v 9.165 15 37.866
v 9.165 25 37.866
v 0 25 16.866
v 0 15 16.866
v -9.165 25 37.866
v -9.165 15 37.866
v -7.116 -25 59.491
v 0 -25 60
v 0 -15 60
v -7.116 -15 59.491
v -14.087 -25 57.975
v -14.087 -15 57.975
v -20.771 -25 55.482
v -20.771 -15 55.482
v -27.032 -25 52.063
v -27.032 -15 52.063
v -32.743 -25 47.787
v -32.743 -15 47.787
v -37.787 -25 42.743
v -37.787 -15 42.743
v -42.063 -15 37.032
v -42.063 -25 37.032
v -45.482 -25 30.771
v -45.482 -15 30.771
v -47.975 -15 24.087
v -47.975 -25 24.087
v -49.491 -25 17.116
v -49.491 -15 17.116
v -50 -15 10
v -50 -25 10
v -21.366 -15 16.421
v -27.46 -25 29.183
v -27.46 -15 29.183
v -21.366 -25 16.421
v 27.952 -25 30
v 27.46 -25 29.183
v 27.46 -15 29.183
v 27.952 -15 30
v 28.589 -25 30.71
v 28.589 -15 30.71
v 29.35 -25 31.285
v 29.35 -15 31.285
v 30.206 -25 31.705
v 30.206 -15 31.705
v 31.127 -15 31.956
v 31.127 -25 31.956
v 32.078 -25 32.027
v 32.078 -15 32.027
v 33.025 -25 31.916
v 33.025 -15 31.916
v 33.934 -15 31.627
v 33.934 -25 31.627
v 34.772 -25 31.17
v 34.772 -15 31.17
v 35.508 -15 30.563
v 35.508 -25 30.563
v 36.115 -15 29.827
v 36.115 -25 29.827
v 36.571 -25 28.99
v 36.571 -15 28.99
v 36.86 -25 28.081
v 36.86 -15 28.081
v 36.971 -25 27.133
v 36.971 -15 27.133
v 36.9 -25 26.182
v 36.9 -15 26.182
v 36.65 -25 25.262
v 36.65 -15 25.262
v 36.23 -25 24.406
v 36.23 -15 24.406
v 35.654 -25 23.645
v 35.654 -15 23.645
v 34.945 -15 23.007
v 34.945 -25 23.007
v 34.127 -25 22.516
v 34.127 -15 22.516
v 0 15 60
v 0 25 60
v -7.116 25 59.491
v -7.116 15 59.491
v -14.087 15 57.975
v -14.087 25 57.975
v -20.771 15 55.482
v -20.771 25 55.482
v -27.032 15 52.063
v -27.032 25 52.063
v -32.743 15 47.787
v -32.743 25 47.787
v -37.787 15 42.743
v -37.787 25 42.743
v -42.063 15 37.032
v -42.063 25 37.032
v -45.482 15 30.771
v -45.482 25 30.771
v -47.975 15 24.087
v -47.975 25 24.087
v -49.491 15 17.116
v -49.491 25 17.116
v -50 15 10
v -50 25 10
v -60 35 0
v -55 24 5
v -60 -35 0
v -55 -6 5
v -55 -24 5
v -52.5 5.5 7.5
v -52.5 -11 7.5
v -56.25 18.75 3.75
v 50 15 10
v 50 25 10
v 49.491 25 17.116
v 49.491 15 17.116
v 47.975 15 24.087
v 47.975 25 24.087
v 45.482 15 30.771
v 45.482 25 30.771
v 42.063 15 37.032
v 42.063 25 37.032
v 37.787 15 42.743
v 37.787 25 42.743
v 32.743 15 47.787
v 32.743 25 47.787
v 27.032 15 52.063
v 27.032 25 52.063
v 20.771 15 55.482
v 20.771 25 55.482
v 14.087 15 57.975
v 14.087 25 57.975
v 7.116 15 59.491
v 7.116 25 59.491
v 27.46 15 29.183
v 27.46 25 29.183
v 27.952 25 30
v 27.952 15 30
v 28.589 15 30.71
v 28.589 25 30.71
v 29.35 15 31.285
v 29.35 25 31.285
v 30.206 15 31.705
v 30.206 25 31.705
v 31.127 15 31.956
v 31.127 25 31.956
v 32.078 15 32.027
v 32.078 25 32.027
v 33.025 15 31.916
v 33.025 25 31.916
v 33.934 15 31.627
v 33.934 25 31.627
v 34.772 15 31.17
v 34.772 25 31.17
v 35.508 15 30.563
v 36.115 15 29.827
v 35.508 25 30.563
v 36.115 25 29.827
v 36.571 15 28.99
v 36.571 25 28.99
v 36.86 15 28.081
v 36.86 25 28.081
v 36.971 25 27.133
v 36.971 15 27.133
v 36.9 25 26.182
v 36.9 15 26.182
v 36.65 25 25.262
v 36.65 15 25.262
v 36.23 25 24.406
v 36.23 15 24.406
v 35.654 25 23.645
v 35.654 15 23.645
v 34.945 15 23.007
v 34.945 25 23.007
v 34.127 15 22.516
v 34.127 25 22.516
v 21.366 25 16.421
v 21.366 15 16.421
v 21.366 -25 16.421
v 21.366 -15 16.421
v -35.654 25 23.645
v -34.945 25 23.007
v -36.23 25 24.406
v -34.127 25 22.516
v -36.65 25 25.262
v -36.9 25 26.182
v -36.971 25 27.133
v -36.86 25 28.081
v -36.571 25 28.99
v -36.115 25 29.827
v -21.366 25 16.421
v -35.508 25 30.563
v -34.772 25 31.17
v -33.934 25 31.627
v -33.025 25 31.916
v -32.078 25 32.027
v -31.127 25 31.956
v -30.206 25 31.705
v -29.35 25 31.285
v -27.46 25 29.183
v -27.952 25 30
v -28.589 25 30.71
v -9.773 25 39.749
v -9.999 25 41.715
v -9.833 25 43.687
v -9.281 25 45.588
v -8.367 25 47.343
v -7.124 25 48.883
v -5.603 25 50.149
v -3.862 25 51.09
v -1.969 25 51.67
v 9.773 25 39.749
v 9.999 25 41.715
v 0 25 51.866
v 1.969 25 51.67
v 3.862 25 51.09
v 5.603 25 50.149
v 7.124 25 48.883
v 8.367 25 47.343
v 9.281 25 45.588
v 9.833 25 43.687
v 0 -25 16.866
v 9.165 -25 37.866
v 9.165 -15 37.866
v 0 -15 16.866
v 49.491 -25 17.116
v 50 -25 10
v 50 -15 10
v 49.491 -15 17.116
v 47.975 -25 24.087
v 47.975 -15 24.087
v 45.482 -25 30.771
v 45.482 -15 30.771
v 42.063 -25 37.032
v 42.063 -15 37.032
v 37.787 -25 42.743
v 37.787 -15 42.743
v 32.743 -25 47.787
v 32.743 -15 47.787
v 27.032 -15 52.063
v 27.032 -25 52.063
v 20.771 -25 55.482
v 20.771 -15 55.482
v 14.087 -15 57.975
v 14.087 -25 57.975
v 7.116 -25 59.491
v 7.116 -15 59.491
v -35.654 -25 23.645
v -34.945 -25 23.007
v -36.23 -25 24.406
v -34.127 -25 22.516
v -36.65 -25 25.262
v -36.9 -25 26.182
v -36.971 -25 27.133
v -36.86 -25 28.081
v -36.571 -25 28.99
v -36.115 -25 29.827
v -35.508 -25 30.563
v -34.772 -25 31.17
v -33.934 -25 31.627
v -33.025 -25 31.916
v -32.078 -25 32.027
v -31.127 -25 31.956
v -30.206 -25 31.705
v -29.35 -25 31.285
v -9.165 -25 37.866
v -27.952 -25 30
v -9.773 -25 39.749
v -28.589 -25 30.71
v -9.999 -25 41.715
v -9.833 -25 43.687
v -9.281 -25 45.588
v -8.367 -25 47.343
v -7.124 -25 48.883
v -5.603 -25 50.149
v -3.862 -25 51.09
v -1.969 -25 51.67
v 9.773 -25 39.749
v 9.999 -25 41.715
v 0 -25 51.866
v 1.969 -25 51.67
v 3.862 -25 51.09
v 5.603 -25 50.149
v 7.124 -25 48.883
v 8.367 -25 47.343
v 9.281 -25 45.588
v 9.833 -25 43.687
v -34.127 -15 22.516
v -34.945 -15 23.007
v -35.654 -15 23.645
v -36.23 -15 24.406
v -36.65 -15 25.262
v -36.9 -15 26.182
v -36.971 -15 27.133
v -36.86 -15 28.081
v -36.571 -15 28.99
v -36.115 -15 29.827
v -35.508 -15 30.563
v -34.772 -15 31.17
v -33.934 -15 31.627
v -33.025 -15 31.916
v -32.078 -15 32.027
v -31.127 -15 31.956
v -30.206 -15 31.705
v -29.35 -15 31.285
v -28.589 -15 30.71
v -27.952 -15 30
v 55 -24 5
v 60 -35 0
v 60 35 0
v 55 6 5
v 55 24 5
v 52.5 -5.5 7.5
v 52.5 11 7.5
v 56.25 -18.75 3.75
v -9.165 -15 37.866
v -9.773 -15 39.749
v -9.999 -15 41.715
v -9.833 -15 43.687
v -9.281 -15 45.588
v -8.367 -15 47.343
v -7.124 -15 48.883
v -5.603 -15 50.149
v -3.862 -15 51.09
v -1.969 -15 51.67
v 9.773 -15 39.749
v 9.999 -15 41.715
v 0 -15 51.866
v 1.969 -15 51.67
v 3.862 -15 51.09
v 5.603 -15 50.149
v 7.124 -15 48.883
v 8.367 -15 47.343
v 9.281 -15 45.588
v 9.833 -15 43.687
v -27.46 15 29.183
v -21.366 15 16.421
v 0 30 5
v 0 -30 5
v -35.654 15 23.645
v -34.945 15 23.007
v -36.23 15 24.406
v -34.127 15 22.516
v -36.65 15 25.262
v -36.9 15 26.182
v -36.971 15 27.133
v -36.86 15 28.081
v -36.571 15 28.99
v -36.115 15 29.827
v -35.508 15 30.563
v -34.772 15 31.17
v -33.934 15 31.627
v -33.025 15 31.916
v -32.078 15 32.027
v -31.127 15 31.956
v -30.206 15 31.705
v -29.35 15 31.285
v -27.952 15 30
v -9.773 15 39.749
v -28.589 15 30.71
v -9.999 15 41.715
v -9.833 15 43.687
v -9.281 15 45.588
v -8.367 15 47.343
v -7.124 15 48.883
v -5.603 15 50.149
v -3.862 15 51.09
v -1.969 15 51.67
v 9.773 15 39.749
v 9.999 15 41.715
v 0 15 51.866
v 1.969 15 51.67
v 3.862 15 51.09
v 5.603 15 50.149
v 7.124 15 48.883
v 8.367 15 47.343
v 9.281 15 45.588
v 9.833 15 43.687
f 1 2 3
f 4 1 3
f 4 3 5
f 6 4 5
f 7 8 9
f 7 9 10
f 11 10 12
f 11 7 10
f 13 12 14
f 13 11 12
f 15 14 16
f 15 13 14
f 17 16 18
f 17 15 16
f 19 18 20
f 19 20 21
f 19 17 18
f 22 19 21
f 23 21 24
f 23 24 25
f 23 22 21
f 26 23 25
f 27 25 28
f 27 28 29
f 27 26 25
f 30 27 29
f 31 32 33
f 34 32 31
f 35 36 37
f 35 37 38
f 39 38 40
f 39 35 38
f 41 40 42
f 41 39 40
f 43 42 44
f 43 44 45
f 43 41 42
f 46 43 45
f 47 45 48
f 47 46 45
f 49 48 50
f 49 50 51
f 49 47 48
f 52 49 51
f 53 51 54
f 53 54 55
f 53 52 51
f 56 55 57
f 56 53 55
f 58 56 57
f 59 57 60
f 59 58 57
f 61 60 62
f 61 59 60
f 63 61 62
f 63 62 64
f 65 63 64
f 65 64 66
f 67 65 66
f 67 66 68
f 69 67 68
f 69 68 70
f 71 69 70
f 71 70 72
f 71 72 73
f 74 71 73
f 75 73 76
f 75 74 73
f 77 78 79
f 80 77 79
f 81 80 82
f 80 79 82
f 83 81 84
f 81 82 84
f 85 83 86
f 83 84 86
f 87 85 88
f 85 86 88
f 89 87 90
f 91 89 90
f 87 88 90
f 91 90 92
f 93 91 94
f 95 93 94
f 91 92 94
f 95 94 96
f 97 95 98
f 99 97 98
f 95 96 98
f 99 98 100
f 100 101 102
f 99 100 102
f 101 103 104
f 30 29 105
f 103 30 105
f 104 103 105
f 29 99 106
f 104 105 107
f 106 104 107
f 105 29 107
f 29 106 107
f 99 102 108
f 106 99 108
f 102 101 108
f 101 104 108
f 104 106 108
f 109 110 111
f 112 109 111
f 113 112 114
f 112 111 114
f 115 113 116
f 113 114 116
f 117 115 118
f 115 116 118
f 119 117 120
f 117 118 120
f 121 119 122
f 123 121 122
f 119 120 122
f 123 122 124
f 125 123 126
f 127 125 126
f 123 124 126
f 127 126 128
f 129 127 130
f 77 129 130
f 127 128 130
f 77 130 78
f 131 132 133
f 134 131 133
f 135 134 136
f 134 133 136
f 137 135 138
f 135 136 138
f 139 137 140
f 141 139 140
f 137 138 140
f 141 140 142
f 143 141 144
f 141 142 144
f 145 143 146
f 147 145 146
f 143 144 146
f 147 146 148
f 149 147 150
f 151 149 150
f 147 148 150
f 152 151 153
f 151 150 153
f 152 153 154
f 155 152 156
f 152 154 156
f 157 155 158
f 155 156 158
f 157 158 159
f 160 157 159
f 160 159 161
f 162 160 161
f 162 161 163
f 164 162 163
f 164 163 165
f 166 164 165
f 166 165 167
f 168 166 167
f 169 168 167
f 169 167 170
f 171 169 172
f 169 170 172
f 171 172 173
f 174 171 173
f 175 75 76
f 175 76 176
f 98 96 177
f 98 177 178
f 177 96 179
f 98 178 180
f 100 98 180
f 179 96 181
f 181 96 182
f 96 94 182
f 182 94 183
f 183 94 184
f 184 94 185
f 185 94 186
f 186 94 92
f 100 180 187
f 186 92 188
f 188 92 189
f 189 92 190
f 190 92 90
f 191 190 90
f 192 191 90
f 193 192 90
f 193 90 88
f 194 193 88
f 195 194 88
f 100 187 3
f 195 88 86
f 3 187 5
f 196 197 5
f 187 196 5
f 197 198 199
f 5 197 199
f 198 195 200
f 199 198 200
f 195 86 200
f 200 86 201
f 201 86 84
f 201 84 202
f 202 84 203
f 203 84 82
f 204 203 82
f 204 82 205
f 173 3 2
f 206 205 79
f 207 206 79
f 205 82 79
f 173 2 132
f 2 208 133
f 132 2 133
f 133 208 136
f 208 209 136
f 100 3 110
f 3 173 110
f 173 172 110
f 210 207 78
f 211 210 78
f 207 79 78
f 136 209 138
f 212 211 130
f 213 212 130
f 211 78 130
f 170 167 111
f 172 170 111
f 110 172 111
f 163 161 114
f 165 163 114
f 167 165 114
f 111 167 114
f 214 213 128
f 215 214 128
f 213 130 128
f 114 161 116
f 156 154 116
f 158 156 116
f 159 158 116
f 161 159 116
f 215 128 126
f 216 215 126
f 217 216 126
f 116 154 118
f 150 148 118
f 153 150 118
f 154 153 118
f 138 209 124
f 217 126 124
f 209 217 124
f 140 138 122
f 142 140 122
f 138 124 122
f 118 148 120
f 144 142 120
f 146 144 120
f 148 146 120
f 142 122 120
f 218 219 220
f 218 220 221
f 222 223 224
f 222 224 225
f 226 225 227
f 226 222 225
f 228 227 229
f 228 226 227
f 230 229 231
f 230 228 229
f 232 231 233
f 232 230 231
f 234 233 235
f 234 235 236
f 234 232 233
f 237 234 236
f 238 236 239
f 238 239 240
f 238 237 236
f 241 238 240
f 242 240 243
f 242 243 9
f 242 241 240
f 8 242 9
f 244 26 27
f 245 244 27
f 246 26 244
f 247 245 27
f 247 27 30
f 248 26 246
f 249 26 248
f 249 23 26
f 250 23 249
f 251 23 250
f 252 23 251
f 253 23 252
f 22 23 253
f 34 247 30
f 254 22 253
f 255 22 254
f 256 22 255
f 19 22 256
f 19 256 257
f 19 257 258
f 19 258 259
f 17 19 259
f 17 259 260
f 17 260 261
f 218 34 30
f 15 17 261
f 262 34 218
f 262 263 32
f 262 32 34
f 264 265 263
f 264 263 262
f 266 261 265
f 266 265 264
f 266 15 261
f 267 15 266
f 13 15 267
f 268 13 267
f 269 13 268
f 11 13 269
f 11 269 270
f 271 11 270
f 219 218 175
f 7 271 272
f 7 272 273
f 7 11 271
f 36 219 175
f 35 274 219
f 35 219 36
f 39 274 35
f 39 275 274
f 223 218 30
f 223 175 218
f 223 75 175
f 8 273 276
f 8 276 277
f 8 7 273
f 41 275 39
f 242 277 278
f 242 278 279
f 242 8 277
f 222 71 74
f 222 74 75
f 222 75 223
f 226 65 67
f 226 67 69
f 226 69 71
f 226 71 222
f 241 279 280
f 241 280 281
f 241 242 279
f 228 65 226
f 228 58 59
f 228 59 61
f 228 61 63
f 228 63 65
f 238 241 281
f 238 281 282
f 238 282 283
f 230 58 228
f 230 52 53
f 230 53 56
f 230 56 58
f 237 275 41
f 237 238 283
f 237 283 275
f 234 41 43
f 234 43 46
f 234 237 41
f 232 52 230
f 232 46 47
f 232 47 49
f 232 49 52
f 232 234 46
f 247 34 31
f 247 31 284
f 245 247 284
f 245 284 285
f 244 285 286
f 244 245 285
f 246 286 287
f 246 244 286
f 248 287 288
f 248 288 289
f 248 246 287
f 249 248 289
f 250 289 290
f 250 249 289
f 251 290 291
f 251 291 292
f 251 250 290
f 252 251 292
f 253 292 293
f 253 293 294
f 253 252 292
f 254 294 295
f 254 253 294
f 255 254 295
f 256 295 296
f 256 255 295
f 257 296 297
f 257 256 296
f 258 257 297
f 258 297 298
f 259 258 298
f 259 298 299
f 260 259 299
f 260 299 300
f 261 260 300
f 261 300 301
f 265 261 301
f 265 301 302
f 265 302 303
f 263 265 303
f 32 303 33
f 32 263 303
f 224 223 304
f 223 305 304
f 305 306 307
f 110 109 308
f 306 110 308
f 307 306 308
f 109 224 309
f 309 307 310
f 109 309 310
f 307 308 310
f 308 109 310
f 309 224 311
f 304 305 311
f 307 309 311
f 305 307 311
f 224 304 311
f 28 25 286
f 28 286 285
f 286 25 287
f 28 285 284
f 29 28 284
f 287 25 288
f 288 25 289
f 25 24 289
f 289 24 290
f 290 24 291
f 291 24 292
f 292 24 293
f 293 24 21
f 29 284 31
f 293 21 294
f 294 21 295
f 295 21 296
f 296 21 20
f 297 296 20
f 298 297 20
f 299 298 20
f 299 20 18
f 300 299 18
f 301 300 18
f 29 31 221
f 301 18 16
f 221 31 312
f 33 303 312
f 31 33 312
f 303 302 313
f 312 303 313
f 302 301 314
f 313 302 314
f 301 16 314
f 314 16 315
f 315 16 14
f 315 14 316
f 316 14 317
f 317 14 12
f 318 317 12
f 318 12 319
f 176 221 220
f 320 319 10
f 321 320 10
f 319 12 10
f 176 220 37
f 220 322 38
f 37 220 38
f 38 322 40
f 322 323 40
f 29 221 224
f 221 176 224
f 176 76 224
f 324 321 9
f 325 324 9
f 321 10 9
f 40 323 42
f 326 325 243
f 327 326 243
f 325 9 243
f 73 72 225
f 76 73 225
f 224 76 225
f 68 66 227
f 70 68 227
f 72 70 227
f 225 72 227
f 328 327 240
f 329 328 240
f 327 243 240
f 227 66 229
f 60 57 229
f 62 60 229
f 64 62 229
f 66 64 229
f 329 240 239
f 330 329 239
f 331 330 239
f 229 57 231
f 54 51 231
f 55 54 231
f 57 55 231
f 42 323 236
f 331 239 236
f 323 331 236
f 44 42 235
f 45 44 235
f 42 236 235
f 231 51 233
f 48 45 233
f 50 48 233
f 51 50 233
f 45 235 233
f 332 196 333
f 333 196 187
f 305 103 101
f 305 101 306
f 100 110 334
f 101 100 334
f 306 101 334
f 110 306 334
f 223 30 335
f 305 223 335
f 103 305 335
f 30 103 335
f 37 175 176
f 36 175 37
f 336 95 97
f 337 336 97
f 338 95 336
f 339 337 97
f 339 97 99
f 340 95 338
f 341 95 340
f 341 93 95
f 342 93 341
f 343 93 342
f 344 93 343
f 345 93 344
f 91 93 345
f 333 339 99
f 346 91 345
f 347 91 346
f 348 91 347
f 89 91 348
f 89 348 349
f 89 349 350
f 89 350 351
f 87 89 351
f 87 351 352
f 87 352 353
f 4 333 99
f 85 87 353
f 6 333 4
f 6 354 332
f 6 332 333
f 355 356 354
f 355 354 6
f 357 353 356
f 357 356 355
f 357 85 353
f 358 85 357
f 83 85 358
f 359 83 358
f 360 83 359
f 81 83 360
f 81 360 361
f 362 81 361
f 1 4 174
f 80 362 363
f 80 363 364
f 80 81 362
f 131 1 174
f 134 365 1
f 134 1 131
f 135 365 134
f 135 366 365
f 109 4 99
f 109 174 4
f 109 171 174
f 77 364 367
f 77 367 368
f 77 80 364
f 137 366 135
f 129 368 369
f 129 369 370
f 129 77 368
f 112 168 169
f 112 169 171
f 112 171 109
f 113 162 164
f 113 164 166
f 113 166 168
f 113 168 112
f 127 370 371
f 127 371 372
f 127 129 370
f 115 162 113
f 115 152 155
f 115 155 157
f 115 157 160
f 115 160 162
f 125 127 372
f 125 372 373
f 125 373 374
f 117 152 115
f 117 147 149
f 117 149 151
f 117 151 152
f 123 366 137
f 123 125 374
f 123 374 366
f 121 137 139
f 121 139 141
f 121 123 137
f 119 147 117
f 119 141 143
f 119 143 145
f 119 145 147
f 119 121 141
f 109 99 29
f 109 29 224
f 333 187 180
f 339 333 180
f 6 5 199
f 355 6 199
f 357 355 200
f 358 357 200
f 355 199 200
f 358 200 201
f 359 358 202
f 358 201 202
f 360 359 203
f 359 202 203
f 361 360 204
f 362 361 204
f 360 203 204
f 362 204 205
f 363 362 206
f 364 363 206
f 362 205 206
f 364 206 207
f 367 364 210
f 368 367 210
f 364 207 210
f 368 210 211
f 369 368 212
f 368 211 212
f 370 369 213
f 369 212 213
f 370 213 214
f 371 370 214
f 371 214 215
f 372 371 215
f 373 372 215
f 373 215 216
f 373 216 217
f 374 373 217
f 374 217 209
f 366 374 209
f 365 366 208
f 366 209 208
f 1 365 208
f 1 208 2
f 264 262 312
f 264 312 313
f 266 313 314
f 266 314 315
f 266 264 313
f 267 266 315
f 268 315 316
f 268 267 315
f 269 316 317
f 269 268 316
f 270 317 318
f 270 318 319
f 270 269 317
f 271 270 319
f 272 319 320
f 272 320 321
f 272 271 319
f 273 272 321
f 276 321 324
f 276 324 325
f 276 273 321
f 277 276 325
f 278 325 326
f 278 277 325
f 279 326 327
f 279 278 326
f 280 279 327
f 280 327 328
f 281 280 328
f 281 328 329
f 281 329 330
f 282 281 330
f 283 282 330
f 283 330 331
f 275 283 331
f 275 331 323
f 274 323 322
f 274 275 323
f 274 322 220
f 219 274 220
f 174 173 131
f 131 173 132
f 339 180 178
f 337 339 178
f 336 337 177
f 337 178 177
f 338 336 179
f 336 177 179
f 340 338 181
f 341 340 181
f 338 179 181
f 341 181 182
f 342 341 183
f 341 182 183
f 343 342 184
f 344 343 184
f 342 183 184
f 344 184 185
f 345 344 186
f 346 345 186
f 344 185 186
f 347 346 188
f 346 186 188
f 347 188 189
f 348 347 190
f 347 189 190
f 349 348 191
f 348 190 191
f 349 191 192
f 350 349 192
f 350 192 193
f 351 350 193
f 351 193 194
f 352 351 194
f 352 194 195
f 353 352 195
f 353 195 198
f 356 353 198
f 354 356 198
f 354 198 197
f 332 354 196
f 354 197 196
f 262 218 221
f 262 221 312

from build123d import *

# Parameters (mm, degrees)
F2_W     = 100
F2_H     = 50
F0_W     = 120
F0_H     = 70
F6_DEPTH = 10


with BuildPart() as f3:
    # F2 (on offset) → F3 section 0
    with BuildSketch(Plane.XY.offset(10)):
        Rectangle(F2_W, F2_H)
    # F0 (on Top) → F3 section 1
    with BuildSketch(Plane.XY):
        Rectangle(F0_W, F0_H)
    loft()

    # F5 (on offset) → F6 (join)
    with BuildSketch(Plane.XZ.offset(-25)):
        with BuildLine():
            Line((-50, 10), (50, 10))
            ThreePointArc((50, 10), (35.355339, 45.355339), (0, 60))
            ThreePointArc((0, 60), (-35.355339, 45.355339), (-50, 10))
        make_face()
        with BuildLine():
            Line((-27.4604, 29.182527), (-21.365643, 16.421104))
            Line((-21.365643, 16.421104), (-34.127067, 22.515861))
            ThreePointArc((-34.127067, 22.515861), (-35.507778, 30.563239), (-27.4604, 29.182527))
        make_face(mode=Mode.SUBTRACT)
        with BuildLine():
            ThreePointArc((-9.165151, 37.865514), (0, 51.865514), (9.165151, 37.865514))
            Line((9.165151, 37.865514), (0, 16.865514))
            Line((0, 16.865514), (-9.165151, 37.865514))
        make_face(mode=Mode.SUBTRACT)
        with BuildLine():
            ThreePointArc((27.4604, 29.182527), (35.507778, 30.563239), (34.127067, 22.515861))
            Line((34.127067, 22.515861), (21.365643, 16.421104))
            Line((21.365643, 16.421104), (27.4604, 29.182527))
        make_face(mode=Mode.SUBTRACT)
    extrude(amount=F6_DEPTH)

    # F7: F3 across plane


with BuildPart() as f3_1:
    add(f3.part)
    add(f3.part.mirror(Plane.XZ))


solid = f3_1.part
